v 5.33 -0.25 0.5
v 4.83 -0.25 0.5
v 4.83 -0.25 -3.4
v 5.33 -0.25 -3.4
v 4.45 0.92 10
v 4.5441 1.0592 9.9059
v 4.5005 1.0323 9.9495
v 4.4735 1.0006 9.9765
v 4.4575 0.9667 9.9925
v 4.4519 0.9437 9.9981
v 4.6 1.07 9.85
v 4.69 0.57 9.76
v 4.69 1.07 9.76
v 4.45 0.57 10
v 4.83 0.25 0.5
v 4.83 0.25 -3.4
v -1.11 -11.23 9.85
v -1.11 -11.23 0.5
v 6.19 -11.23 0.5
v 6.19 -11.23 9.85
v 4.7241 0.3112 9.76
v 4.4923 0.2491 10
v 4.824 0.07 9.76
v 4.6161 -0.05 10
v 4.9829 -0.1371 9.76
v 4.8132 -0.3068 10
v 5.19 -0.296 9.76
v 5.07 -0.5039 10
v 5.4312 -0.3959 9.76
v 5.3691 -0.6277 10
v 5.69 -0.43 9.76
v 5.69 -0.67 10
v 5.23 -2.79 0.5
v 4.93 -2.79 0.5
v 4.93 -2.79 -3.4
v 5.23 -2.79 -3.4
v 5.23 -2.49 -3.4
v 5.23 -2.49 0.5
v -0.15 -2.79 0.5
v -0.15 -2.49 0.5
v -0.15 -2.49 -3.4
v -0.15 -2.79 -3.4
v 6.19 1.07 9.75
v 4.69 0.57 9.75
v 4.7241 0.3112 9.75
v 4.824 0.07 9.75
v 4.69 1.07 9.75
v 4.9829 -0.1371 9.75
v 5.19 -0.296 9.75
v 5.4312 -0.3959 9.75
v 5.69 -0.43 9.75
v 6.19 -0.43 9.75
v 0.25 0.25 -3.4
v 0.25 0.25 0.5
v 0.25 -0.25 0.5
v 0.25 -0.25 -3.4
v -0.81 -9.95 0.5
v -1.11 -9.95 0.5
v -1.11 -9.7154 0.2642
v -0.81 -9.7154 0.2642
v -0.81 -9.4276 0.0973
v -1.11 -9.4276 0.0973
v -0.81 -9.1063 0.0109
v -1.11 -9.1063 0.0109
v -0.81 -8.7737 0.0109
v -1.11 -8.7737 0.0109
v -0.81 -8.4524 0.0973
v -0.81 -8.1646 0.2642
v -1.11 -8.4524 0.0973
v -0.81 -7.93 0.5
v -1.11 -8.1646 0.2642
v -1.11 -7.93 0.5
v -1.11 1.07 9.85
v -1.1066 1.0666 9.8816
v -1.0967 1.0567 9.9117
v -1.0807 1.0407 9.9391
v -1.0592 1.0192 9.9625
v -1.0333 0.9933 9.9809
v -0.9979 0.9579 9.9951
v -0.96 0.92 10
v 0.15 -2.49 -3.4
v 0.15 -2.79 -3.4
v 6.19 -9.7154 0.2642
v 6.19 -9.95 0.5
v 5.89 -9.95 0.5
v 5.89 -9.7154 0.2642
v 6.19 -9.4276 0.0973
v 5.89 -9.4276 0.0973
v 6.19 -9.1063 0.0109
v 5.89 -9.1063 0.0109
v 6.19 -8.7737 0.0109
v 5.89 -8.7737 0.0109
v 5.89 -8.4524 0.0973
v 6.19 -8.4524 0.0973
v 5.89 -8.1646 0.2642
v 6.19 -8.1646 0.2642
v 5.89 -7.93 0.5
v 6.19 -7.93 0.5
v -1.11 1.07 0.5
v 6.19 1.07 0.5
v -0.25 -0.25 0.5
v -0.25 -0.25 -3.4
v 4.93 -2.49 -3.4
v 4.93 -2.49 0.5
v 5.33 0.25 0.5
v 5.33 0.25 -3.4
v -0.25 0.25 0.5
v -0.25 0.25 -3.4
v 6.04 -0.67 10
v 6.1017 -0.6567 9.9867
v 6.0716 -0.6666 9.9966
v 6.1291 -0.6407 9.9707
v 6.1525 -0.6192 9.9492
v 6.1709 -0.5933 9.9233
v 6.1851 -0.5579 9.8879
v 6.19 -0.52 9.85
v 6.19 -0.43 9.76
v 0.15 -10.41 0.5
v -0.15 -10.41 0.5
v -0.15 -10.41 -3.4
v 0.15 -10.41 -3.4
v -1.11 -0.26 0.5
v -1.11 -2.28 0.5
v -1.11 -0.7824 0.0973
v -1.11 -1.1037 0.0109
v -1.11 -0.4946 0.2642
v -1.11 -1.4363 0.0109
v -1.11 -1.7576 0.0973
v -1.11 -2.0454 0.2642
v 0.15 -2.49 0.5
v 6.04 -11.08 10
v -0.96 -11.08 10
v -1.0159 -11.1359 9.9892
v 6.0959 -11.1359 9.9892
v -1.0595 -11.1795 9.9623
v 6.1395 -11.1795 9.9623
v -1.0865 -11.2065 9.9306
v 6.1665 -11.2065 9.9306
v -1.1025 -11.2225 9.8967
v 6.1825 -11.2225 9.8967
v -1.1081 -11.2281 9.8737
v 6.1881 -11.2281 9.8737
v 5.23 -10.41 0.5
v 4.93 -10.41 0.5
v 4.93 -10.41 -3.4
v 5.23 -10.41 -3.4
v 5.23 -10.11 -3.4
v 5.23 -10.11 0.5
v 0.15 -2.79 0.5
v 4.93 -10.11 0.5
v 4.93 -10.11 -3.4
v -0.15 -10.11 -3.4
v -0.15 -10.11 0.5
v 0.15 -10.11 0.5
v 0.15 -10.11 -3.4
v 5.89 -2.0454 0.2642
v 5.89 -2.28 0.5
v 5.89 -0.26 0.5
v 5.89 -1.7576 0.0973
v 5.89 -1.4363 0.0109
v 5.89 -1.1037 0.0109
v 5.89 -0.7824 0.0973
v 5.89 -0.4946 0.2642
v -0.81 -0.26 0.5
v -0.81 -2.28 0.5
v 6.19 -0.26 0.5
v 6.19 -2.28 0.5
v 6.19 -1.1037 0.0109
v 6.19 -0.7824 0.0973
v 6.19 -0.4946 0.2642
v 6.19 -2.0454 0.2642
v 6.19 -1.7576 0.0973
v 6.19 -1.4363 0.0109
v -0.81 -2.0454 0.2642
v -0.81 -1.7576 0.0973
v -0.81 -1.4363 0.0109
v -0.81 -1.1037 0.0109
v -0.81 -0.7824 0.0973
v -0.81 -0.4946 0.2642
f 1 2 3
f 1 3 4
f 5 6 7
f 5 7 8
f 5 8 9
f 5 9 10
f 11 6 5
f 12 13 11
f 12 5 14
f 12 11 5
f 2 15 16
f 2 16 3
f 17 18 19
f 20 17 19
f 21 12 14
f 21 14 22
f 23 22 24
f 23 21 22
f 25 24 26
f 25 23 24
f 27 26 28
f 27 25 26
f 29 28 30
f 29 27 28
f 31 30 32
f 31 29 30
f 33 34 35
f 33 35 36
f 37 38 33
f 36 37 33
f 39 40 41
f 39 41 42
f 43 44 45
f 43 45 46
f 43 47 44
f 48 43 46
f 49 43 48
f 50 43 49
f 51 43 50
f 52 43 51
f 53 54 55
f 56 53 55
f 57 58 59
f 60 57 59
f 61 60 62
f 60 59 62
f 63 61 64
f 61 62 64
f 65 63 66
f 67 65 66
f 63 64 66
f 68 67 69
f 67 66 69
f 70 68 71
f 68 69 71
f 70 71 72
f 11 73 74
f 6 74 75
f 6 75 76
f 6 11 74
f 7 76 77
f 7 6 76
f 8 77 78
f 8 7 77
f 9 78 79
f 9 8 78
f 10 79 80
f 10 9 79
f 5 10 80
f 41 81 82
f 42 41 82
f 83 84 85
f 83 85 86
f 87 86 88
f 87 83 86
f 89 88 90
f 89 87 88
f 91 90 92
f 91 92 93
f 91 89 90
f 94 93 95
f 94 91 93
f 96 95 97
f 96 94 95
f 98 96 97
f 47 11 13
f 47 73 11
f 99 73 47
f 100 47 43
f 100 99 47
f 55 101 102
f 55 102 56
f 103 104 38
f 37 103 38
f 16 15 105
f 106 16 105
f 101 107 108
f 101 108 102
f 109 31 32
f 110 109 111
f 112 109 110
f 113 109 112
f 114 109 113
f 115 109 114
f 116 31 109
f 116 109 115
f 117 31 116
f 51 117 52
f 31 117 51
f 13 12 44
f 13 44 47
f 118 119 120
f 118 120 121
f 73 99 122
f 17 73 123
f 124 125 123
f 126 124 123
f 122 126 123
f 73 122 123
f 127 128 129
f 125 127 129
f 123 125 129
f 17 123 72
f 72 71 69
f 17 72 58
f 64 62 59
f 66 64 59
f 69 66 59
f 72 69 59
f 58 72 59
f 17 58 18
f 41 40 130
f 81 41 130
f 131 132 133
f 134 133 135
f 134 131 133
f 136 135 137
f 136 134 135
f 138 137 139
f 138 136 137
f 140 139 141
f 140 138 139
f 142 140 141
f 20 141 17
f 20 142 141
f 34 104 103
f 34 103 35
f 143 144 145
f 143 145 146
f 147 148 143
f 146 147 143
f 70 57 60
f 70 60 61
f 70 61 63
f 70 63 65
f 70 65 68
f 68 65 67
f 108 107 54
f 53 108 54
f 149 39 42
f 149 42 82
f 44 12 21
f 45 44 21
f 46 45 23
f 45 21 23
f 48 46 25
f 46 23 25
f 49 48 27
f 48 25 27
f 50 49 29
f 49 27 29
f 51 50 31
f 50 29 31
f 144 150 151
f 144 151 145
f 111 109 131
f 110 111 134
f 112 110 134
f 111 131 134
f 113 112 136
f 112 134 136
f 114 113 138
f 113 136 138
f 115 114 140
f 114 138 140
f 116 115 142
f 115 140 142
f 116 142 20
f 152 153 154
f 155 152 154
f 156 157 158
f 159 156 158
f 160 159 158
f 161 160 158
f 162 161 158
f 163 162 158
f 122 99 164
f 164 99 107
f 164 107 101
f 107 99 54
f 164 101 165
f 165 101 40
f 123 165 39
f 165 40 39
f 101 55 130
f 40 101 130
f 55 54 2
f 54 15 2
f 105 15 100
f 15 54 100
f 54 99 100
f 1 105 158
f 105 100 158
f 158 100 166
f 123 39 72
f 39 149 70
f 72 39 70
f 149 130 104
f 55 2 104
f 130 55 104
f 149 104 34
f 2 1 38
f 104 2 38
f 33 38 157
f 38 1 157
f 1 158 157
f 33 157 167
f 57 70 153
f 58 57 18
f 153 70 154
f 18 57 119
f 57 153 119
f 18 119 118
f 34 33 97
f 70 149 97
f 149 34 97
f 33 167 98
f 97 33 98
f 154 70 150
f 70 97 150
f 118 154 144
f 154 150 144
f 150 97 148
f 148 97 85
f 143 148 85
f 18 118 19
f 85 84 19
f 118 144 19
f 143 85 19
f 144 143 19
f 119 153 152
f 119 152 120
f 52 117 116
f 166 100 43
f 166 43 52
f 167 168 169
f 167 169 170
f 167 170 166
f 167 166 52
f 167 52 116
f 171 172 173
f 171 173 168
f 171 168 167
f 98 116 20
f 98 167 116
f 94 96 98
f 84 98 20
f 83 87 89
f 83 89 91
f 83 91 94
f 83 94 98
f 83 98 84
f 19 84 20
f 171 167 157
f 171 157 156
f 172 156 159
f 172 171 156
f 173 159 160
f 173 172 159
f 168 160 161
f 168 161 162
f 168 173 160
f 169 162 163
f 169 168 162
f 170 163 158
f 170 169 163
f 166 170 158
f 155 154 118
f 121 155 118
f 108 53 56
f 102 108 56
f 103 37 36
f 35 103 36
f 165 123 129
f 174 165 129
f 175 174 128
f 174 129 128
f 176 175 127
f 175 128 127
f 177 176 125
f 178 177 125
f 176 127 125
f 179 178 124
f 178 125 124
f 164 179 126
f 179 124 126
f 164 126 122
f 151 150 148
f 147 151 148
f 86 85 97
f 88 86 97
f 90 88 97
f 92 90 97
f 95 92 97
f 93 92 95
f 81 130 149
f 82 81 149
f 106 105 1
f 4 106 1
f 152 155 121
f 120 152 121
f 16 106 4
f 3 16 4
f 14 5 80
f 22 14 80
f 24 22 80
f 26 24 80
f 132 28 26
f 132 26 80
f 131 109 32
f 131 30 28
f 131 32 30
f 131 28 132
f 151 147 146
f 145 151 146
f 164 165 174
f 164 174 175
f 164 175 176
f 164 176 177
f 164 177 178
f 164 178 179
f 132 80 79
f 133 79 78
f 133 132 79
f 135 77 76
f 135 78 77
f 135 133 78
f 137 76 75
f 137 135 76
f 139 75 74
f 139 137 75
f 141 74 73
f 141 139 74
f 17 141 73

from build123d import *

# Parameters (mm, degrees)
PAD002_DEPTH  = 0.3
SKETCH_W      = 12.3
SKETCH_H      = 7.3
PAD_DEPTH     = 9.5
POCKET_DEPTH  = 0.25
CHAMFER_SIZE  = 0.24
FILLET_R      = 0.15
SKETCH001_W   = 0.5
SKETCH001_H   = 0.5
SKETCH001_W_2 = 0.3
SKETCH001_H_2 = 0.3
PAD001_DEPTH  = 4
PAD003_DEPTH  = 0.3


with BuildPart() as pad002:
    # Sketch003 → Pad002 (new body)
    with BuildSketch(Plane.YZ.offset(6.19)):
        with BuildLine():
            ThreePointArc((-10.21, 1.27), (-8.94, 0), (-7.67, 1.27))
            Line((-10.21, 1.27), (-7.67, 1.27))
        make_face()
        with BuildLine():
            ThreePointArc((-2.54, 1.27), (-1.27, 0), (0, 1.27))
            Line((-2.54, 1.27), (0, 1.27))
        make_face()
    extrude(amount=-PAD002_DEPTH)


with BuildPart() as fillet_body:
    # Sketch → Pad (new body)
    with BuildSketch(Plane(origin=(0, 0, 0.5), x_dir=(0, -1, 0), z_dir=(0, 0, 1))):
        with Locations((5.08, 2.54)):
            Rectangle(SKETCH_W, SKETCH_H)
    extrude(amount=PAD_DEPTH)

    # Sketch002 → Pocket (cut)
    with BuildSketch(Plane(origin=(0, 0, 10), x_dir=(0, -1, 0), z_dir=(0, 0, 1))):
        with BuildLine():
            ThreePointArc((-0.57, 4.69), (0.137107, 4.982894), (0.43, 5.690001))
            Line((0.43, 6.19), (0.43, 5.690001))
            Line((-1.07, 6.19), (0.43, 6.19))
            Line((-1.07, 4.69), (-1.07, 6.19))
            Line((-0.57, 4.69), (-1.07, 4.69))
        make_face()
    extrude(amount=-POCKET_DEPTH, mode=Mode.SUBTRACT)

    # Chamfer
    chamfer_edges = [fillet_body.edges().sort_by_distance(p)[0] for p in [
        (4.982894, -0.137107, 10),
        (5.940001, -0.43, 10),
        (4.69, 0.82, 10),
    ]]
    chamfer(chamfer_edges, length=CHAMFER_SIZE)

    # Fillet
    fillet_edges = [fillet_body.edges().sort_by_distance(p)[0] for p in [
        (6.19, -5.95, 10),
        (1.67, 1.07, 10),
        (-1.11, -5.08, 10),
        (2.54, -11.23, 10),
    ]]
    fillet(fillet_edges, radius=FILLET_R)


with BuildPart() as pad001:
    # Sketch001 → Pad001 (new body)
    with BuildSketch(Plane(origin=(0, 0, 0.6), x_dir=(0, -1, 0), z_dir=(0, 0, 1))):
        Rectangle(SKETCH001_W, SKETCH001_H)
        with Locations((2.64, 0)):
            Rectangle(SKETCH001_W_2, SKETCH001_H_2)
        with Locations((0, 5.08)):
            Rectangle(SKETCH001_W, SKETCH001_H)
        with Locations((2.64, 5.08)):
            Rectangle(SKETCH001_W_2, SKETCH001_H_2)
        with Locations((10.26, 0)):
            Rectangle(SKETCH001_W_2, SKETCH001_H_2)
        with Locations((10.26, 5.08)):
            Rectangle(SKETCH001_W_2, SKETCH001_H_2)
    extrude(amount=-PAD001_DEPTH)


with BuildPart() as pad003_mp_cp:
    # Sketch004 → Pad003 (new body)
    with BuildSketch(Plane.YZ.offset(-1.11)):
        with BuildLine():
            ThreePointArc((-10.21, 1.27), (-8.94, 0), (-7.67, 1.27))
            Line((-10.21, 1.27), (-7.67, 1.27))
        make_face()
        with BuildLine():
            ThreePointArc((-2.54, 1.27), (-1.27, 0), (0, 1.27))
            Line((-2.54, 1.27), (0, 1.27))
        make_face()
    extrude(amount=PAD003_DEPTH)

    # Pad003_mp_cp: union Pad002, Fillet body, Pad001
    add(pad002.part)
    add(fillet_body.part)
    add(pad001.part)


solid = pad003_mp_cp.part
